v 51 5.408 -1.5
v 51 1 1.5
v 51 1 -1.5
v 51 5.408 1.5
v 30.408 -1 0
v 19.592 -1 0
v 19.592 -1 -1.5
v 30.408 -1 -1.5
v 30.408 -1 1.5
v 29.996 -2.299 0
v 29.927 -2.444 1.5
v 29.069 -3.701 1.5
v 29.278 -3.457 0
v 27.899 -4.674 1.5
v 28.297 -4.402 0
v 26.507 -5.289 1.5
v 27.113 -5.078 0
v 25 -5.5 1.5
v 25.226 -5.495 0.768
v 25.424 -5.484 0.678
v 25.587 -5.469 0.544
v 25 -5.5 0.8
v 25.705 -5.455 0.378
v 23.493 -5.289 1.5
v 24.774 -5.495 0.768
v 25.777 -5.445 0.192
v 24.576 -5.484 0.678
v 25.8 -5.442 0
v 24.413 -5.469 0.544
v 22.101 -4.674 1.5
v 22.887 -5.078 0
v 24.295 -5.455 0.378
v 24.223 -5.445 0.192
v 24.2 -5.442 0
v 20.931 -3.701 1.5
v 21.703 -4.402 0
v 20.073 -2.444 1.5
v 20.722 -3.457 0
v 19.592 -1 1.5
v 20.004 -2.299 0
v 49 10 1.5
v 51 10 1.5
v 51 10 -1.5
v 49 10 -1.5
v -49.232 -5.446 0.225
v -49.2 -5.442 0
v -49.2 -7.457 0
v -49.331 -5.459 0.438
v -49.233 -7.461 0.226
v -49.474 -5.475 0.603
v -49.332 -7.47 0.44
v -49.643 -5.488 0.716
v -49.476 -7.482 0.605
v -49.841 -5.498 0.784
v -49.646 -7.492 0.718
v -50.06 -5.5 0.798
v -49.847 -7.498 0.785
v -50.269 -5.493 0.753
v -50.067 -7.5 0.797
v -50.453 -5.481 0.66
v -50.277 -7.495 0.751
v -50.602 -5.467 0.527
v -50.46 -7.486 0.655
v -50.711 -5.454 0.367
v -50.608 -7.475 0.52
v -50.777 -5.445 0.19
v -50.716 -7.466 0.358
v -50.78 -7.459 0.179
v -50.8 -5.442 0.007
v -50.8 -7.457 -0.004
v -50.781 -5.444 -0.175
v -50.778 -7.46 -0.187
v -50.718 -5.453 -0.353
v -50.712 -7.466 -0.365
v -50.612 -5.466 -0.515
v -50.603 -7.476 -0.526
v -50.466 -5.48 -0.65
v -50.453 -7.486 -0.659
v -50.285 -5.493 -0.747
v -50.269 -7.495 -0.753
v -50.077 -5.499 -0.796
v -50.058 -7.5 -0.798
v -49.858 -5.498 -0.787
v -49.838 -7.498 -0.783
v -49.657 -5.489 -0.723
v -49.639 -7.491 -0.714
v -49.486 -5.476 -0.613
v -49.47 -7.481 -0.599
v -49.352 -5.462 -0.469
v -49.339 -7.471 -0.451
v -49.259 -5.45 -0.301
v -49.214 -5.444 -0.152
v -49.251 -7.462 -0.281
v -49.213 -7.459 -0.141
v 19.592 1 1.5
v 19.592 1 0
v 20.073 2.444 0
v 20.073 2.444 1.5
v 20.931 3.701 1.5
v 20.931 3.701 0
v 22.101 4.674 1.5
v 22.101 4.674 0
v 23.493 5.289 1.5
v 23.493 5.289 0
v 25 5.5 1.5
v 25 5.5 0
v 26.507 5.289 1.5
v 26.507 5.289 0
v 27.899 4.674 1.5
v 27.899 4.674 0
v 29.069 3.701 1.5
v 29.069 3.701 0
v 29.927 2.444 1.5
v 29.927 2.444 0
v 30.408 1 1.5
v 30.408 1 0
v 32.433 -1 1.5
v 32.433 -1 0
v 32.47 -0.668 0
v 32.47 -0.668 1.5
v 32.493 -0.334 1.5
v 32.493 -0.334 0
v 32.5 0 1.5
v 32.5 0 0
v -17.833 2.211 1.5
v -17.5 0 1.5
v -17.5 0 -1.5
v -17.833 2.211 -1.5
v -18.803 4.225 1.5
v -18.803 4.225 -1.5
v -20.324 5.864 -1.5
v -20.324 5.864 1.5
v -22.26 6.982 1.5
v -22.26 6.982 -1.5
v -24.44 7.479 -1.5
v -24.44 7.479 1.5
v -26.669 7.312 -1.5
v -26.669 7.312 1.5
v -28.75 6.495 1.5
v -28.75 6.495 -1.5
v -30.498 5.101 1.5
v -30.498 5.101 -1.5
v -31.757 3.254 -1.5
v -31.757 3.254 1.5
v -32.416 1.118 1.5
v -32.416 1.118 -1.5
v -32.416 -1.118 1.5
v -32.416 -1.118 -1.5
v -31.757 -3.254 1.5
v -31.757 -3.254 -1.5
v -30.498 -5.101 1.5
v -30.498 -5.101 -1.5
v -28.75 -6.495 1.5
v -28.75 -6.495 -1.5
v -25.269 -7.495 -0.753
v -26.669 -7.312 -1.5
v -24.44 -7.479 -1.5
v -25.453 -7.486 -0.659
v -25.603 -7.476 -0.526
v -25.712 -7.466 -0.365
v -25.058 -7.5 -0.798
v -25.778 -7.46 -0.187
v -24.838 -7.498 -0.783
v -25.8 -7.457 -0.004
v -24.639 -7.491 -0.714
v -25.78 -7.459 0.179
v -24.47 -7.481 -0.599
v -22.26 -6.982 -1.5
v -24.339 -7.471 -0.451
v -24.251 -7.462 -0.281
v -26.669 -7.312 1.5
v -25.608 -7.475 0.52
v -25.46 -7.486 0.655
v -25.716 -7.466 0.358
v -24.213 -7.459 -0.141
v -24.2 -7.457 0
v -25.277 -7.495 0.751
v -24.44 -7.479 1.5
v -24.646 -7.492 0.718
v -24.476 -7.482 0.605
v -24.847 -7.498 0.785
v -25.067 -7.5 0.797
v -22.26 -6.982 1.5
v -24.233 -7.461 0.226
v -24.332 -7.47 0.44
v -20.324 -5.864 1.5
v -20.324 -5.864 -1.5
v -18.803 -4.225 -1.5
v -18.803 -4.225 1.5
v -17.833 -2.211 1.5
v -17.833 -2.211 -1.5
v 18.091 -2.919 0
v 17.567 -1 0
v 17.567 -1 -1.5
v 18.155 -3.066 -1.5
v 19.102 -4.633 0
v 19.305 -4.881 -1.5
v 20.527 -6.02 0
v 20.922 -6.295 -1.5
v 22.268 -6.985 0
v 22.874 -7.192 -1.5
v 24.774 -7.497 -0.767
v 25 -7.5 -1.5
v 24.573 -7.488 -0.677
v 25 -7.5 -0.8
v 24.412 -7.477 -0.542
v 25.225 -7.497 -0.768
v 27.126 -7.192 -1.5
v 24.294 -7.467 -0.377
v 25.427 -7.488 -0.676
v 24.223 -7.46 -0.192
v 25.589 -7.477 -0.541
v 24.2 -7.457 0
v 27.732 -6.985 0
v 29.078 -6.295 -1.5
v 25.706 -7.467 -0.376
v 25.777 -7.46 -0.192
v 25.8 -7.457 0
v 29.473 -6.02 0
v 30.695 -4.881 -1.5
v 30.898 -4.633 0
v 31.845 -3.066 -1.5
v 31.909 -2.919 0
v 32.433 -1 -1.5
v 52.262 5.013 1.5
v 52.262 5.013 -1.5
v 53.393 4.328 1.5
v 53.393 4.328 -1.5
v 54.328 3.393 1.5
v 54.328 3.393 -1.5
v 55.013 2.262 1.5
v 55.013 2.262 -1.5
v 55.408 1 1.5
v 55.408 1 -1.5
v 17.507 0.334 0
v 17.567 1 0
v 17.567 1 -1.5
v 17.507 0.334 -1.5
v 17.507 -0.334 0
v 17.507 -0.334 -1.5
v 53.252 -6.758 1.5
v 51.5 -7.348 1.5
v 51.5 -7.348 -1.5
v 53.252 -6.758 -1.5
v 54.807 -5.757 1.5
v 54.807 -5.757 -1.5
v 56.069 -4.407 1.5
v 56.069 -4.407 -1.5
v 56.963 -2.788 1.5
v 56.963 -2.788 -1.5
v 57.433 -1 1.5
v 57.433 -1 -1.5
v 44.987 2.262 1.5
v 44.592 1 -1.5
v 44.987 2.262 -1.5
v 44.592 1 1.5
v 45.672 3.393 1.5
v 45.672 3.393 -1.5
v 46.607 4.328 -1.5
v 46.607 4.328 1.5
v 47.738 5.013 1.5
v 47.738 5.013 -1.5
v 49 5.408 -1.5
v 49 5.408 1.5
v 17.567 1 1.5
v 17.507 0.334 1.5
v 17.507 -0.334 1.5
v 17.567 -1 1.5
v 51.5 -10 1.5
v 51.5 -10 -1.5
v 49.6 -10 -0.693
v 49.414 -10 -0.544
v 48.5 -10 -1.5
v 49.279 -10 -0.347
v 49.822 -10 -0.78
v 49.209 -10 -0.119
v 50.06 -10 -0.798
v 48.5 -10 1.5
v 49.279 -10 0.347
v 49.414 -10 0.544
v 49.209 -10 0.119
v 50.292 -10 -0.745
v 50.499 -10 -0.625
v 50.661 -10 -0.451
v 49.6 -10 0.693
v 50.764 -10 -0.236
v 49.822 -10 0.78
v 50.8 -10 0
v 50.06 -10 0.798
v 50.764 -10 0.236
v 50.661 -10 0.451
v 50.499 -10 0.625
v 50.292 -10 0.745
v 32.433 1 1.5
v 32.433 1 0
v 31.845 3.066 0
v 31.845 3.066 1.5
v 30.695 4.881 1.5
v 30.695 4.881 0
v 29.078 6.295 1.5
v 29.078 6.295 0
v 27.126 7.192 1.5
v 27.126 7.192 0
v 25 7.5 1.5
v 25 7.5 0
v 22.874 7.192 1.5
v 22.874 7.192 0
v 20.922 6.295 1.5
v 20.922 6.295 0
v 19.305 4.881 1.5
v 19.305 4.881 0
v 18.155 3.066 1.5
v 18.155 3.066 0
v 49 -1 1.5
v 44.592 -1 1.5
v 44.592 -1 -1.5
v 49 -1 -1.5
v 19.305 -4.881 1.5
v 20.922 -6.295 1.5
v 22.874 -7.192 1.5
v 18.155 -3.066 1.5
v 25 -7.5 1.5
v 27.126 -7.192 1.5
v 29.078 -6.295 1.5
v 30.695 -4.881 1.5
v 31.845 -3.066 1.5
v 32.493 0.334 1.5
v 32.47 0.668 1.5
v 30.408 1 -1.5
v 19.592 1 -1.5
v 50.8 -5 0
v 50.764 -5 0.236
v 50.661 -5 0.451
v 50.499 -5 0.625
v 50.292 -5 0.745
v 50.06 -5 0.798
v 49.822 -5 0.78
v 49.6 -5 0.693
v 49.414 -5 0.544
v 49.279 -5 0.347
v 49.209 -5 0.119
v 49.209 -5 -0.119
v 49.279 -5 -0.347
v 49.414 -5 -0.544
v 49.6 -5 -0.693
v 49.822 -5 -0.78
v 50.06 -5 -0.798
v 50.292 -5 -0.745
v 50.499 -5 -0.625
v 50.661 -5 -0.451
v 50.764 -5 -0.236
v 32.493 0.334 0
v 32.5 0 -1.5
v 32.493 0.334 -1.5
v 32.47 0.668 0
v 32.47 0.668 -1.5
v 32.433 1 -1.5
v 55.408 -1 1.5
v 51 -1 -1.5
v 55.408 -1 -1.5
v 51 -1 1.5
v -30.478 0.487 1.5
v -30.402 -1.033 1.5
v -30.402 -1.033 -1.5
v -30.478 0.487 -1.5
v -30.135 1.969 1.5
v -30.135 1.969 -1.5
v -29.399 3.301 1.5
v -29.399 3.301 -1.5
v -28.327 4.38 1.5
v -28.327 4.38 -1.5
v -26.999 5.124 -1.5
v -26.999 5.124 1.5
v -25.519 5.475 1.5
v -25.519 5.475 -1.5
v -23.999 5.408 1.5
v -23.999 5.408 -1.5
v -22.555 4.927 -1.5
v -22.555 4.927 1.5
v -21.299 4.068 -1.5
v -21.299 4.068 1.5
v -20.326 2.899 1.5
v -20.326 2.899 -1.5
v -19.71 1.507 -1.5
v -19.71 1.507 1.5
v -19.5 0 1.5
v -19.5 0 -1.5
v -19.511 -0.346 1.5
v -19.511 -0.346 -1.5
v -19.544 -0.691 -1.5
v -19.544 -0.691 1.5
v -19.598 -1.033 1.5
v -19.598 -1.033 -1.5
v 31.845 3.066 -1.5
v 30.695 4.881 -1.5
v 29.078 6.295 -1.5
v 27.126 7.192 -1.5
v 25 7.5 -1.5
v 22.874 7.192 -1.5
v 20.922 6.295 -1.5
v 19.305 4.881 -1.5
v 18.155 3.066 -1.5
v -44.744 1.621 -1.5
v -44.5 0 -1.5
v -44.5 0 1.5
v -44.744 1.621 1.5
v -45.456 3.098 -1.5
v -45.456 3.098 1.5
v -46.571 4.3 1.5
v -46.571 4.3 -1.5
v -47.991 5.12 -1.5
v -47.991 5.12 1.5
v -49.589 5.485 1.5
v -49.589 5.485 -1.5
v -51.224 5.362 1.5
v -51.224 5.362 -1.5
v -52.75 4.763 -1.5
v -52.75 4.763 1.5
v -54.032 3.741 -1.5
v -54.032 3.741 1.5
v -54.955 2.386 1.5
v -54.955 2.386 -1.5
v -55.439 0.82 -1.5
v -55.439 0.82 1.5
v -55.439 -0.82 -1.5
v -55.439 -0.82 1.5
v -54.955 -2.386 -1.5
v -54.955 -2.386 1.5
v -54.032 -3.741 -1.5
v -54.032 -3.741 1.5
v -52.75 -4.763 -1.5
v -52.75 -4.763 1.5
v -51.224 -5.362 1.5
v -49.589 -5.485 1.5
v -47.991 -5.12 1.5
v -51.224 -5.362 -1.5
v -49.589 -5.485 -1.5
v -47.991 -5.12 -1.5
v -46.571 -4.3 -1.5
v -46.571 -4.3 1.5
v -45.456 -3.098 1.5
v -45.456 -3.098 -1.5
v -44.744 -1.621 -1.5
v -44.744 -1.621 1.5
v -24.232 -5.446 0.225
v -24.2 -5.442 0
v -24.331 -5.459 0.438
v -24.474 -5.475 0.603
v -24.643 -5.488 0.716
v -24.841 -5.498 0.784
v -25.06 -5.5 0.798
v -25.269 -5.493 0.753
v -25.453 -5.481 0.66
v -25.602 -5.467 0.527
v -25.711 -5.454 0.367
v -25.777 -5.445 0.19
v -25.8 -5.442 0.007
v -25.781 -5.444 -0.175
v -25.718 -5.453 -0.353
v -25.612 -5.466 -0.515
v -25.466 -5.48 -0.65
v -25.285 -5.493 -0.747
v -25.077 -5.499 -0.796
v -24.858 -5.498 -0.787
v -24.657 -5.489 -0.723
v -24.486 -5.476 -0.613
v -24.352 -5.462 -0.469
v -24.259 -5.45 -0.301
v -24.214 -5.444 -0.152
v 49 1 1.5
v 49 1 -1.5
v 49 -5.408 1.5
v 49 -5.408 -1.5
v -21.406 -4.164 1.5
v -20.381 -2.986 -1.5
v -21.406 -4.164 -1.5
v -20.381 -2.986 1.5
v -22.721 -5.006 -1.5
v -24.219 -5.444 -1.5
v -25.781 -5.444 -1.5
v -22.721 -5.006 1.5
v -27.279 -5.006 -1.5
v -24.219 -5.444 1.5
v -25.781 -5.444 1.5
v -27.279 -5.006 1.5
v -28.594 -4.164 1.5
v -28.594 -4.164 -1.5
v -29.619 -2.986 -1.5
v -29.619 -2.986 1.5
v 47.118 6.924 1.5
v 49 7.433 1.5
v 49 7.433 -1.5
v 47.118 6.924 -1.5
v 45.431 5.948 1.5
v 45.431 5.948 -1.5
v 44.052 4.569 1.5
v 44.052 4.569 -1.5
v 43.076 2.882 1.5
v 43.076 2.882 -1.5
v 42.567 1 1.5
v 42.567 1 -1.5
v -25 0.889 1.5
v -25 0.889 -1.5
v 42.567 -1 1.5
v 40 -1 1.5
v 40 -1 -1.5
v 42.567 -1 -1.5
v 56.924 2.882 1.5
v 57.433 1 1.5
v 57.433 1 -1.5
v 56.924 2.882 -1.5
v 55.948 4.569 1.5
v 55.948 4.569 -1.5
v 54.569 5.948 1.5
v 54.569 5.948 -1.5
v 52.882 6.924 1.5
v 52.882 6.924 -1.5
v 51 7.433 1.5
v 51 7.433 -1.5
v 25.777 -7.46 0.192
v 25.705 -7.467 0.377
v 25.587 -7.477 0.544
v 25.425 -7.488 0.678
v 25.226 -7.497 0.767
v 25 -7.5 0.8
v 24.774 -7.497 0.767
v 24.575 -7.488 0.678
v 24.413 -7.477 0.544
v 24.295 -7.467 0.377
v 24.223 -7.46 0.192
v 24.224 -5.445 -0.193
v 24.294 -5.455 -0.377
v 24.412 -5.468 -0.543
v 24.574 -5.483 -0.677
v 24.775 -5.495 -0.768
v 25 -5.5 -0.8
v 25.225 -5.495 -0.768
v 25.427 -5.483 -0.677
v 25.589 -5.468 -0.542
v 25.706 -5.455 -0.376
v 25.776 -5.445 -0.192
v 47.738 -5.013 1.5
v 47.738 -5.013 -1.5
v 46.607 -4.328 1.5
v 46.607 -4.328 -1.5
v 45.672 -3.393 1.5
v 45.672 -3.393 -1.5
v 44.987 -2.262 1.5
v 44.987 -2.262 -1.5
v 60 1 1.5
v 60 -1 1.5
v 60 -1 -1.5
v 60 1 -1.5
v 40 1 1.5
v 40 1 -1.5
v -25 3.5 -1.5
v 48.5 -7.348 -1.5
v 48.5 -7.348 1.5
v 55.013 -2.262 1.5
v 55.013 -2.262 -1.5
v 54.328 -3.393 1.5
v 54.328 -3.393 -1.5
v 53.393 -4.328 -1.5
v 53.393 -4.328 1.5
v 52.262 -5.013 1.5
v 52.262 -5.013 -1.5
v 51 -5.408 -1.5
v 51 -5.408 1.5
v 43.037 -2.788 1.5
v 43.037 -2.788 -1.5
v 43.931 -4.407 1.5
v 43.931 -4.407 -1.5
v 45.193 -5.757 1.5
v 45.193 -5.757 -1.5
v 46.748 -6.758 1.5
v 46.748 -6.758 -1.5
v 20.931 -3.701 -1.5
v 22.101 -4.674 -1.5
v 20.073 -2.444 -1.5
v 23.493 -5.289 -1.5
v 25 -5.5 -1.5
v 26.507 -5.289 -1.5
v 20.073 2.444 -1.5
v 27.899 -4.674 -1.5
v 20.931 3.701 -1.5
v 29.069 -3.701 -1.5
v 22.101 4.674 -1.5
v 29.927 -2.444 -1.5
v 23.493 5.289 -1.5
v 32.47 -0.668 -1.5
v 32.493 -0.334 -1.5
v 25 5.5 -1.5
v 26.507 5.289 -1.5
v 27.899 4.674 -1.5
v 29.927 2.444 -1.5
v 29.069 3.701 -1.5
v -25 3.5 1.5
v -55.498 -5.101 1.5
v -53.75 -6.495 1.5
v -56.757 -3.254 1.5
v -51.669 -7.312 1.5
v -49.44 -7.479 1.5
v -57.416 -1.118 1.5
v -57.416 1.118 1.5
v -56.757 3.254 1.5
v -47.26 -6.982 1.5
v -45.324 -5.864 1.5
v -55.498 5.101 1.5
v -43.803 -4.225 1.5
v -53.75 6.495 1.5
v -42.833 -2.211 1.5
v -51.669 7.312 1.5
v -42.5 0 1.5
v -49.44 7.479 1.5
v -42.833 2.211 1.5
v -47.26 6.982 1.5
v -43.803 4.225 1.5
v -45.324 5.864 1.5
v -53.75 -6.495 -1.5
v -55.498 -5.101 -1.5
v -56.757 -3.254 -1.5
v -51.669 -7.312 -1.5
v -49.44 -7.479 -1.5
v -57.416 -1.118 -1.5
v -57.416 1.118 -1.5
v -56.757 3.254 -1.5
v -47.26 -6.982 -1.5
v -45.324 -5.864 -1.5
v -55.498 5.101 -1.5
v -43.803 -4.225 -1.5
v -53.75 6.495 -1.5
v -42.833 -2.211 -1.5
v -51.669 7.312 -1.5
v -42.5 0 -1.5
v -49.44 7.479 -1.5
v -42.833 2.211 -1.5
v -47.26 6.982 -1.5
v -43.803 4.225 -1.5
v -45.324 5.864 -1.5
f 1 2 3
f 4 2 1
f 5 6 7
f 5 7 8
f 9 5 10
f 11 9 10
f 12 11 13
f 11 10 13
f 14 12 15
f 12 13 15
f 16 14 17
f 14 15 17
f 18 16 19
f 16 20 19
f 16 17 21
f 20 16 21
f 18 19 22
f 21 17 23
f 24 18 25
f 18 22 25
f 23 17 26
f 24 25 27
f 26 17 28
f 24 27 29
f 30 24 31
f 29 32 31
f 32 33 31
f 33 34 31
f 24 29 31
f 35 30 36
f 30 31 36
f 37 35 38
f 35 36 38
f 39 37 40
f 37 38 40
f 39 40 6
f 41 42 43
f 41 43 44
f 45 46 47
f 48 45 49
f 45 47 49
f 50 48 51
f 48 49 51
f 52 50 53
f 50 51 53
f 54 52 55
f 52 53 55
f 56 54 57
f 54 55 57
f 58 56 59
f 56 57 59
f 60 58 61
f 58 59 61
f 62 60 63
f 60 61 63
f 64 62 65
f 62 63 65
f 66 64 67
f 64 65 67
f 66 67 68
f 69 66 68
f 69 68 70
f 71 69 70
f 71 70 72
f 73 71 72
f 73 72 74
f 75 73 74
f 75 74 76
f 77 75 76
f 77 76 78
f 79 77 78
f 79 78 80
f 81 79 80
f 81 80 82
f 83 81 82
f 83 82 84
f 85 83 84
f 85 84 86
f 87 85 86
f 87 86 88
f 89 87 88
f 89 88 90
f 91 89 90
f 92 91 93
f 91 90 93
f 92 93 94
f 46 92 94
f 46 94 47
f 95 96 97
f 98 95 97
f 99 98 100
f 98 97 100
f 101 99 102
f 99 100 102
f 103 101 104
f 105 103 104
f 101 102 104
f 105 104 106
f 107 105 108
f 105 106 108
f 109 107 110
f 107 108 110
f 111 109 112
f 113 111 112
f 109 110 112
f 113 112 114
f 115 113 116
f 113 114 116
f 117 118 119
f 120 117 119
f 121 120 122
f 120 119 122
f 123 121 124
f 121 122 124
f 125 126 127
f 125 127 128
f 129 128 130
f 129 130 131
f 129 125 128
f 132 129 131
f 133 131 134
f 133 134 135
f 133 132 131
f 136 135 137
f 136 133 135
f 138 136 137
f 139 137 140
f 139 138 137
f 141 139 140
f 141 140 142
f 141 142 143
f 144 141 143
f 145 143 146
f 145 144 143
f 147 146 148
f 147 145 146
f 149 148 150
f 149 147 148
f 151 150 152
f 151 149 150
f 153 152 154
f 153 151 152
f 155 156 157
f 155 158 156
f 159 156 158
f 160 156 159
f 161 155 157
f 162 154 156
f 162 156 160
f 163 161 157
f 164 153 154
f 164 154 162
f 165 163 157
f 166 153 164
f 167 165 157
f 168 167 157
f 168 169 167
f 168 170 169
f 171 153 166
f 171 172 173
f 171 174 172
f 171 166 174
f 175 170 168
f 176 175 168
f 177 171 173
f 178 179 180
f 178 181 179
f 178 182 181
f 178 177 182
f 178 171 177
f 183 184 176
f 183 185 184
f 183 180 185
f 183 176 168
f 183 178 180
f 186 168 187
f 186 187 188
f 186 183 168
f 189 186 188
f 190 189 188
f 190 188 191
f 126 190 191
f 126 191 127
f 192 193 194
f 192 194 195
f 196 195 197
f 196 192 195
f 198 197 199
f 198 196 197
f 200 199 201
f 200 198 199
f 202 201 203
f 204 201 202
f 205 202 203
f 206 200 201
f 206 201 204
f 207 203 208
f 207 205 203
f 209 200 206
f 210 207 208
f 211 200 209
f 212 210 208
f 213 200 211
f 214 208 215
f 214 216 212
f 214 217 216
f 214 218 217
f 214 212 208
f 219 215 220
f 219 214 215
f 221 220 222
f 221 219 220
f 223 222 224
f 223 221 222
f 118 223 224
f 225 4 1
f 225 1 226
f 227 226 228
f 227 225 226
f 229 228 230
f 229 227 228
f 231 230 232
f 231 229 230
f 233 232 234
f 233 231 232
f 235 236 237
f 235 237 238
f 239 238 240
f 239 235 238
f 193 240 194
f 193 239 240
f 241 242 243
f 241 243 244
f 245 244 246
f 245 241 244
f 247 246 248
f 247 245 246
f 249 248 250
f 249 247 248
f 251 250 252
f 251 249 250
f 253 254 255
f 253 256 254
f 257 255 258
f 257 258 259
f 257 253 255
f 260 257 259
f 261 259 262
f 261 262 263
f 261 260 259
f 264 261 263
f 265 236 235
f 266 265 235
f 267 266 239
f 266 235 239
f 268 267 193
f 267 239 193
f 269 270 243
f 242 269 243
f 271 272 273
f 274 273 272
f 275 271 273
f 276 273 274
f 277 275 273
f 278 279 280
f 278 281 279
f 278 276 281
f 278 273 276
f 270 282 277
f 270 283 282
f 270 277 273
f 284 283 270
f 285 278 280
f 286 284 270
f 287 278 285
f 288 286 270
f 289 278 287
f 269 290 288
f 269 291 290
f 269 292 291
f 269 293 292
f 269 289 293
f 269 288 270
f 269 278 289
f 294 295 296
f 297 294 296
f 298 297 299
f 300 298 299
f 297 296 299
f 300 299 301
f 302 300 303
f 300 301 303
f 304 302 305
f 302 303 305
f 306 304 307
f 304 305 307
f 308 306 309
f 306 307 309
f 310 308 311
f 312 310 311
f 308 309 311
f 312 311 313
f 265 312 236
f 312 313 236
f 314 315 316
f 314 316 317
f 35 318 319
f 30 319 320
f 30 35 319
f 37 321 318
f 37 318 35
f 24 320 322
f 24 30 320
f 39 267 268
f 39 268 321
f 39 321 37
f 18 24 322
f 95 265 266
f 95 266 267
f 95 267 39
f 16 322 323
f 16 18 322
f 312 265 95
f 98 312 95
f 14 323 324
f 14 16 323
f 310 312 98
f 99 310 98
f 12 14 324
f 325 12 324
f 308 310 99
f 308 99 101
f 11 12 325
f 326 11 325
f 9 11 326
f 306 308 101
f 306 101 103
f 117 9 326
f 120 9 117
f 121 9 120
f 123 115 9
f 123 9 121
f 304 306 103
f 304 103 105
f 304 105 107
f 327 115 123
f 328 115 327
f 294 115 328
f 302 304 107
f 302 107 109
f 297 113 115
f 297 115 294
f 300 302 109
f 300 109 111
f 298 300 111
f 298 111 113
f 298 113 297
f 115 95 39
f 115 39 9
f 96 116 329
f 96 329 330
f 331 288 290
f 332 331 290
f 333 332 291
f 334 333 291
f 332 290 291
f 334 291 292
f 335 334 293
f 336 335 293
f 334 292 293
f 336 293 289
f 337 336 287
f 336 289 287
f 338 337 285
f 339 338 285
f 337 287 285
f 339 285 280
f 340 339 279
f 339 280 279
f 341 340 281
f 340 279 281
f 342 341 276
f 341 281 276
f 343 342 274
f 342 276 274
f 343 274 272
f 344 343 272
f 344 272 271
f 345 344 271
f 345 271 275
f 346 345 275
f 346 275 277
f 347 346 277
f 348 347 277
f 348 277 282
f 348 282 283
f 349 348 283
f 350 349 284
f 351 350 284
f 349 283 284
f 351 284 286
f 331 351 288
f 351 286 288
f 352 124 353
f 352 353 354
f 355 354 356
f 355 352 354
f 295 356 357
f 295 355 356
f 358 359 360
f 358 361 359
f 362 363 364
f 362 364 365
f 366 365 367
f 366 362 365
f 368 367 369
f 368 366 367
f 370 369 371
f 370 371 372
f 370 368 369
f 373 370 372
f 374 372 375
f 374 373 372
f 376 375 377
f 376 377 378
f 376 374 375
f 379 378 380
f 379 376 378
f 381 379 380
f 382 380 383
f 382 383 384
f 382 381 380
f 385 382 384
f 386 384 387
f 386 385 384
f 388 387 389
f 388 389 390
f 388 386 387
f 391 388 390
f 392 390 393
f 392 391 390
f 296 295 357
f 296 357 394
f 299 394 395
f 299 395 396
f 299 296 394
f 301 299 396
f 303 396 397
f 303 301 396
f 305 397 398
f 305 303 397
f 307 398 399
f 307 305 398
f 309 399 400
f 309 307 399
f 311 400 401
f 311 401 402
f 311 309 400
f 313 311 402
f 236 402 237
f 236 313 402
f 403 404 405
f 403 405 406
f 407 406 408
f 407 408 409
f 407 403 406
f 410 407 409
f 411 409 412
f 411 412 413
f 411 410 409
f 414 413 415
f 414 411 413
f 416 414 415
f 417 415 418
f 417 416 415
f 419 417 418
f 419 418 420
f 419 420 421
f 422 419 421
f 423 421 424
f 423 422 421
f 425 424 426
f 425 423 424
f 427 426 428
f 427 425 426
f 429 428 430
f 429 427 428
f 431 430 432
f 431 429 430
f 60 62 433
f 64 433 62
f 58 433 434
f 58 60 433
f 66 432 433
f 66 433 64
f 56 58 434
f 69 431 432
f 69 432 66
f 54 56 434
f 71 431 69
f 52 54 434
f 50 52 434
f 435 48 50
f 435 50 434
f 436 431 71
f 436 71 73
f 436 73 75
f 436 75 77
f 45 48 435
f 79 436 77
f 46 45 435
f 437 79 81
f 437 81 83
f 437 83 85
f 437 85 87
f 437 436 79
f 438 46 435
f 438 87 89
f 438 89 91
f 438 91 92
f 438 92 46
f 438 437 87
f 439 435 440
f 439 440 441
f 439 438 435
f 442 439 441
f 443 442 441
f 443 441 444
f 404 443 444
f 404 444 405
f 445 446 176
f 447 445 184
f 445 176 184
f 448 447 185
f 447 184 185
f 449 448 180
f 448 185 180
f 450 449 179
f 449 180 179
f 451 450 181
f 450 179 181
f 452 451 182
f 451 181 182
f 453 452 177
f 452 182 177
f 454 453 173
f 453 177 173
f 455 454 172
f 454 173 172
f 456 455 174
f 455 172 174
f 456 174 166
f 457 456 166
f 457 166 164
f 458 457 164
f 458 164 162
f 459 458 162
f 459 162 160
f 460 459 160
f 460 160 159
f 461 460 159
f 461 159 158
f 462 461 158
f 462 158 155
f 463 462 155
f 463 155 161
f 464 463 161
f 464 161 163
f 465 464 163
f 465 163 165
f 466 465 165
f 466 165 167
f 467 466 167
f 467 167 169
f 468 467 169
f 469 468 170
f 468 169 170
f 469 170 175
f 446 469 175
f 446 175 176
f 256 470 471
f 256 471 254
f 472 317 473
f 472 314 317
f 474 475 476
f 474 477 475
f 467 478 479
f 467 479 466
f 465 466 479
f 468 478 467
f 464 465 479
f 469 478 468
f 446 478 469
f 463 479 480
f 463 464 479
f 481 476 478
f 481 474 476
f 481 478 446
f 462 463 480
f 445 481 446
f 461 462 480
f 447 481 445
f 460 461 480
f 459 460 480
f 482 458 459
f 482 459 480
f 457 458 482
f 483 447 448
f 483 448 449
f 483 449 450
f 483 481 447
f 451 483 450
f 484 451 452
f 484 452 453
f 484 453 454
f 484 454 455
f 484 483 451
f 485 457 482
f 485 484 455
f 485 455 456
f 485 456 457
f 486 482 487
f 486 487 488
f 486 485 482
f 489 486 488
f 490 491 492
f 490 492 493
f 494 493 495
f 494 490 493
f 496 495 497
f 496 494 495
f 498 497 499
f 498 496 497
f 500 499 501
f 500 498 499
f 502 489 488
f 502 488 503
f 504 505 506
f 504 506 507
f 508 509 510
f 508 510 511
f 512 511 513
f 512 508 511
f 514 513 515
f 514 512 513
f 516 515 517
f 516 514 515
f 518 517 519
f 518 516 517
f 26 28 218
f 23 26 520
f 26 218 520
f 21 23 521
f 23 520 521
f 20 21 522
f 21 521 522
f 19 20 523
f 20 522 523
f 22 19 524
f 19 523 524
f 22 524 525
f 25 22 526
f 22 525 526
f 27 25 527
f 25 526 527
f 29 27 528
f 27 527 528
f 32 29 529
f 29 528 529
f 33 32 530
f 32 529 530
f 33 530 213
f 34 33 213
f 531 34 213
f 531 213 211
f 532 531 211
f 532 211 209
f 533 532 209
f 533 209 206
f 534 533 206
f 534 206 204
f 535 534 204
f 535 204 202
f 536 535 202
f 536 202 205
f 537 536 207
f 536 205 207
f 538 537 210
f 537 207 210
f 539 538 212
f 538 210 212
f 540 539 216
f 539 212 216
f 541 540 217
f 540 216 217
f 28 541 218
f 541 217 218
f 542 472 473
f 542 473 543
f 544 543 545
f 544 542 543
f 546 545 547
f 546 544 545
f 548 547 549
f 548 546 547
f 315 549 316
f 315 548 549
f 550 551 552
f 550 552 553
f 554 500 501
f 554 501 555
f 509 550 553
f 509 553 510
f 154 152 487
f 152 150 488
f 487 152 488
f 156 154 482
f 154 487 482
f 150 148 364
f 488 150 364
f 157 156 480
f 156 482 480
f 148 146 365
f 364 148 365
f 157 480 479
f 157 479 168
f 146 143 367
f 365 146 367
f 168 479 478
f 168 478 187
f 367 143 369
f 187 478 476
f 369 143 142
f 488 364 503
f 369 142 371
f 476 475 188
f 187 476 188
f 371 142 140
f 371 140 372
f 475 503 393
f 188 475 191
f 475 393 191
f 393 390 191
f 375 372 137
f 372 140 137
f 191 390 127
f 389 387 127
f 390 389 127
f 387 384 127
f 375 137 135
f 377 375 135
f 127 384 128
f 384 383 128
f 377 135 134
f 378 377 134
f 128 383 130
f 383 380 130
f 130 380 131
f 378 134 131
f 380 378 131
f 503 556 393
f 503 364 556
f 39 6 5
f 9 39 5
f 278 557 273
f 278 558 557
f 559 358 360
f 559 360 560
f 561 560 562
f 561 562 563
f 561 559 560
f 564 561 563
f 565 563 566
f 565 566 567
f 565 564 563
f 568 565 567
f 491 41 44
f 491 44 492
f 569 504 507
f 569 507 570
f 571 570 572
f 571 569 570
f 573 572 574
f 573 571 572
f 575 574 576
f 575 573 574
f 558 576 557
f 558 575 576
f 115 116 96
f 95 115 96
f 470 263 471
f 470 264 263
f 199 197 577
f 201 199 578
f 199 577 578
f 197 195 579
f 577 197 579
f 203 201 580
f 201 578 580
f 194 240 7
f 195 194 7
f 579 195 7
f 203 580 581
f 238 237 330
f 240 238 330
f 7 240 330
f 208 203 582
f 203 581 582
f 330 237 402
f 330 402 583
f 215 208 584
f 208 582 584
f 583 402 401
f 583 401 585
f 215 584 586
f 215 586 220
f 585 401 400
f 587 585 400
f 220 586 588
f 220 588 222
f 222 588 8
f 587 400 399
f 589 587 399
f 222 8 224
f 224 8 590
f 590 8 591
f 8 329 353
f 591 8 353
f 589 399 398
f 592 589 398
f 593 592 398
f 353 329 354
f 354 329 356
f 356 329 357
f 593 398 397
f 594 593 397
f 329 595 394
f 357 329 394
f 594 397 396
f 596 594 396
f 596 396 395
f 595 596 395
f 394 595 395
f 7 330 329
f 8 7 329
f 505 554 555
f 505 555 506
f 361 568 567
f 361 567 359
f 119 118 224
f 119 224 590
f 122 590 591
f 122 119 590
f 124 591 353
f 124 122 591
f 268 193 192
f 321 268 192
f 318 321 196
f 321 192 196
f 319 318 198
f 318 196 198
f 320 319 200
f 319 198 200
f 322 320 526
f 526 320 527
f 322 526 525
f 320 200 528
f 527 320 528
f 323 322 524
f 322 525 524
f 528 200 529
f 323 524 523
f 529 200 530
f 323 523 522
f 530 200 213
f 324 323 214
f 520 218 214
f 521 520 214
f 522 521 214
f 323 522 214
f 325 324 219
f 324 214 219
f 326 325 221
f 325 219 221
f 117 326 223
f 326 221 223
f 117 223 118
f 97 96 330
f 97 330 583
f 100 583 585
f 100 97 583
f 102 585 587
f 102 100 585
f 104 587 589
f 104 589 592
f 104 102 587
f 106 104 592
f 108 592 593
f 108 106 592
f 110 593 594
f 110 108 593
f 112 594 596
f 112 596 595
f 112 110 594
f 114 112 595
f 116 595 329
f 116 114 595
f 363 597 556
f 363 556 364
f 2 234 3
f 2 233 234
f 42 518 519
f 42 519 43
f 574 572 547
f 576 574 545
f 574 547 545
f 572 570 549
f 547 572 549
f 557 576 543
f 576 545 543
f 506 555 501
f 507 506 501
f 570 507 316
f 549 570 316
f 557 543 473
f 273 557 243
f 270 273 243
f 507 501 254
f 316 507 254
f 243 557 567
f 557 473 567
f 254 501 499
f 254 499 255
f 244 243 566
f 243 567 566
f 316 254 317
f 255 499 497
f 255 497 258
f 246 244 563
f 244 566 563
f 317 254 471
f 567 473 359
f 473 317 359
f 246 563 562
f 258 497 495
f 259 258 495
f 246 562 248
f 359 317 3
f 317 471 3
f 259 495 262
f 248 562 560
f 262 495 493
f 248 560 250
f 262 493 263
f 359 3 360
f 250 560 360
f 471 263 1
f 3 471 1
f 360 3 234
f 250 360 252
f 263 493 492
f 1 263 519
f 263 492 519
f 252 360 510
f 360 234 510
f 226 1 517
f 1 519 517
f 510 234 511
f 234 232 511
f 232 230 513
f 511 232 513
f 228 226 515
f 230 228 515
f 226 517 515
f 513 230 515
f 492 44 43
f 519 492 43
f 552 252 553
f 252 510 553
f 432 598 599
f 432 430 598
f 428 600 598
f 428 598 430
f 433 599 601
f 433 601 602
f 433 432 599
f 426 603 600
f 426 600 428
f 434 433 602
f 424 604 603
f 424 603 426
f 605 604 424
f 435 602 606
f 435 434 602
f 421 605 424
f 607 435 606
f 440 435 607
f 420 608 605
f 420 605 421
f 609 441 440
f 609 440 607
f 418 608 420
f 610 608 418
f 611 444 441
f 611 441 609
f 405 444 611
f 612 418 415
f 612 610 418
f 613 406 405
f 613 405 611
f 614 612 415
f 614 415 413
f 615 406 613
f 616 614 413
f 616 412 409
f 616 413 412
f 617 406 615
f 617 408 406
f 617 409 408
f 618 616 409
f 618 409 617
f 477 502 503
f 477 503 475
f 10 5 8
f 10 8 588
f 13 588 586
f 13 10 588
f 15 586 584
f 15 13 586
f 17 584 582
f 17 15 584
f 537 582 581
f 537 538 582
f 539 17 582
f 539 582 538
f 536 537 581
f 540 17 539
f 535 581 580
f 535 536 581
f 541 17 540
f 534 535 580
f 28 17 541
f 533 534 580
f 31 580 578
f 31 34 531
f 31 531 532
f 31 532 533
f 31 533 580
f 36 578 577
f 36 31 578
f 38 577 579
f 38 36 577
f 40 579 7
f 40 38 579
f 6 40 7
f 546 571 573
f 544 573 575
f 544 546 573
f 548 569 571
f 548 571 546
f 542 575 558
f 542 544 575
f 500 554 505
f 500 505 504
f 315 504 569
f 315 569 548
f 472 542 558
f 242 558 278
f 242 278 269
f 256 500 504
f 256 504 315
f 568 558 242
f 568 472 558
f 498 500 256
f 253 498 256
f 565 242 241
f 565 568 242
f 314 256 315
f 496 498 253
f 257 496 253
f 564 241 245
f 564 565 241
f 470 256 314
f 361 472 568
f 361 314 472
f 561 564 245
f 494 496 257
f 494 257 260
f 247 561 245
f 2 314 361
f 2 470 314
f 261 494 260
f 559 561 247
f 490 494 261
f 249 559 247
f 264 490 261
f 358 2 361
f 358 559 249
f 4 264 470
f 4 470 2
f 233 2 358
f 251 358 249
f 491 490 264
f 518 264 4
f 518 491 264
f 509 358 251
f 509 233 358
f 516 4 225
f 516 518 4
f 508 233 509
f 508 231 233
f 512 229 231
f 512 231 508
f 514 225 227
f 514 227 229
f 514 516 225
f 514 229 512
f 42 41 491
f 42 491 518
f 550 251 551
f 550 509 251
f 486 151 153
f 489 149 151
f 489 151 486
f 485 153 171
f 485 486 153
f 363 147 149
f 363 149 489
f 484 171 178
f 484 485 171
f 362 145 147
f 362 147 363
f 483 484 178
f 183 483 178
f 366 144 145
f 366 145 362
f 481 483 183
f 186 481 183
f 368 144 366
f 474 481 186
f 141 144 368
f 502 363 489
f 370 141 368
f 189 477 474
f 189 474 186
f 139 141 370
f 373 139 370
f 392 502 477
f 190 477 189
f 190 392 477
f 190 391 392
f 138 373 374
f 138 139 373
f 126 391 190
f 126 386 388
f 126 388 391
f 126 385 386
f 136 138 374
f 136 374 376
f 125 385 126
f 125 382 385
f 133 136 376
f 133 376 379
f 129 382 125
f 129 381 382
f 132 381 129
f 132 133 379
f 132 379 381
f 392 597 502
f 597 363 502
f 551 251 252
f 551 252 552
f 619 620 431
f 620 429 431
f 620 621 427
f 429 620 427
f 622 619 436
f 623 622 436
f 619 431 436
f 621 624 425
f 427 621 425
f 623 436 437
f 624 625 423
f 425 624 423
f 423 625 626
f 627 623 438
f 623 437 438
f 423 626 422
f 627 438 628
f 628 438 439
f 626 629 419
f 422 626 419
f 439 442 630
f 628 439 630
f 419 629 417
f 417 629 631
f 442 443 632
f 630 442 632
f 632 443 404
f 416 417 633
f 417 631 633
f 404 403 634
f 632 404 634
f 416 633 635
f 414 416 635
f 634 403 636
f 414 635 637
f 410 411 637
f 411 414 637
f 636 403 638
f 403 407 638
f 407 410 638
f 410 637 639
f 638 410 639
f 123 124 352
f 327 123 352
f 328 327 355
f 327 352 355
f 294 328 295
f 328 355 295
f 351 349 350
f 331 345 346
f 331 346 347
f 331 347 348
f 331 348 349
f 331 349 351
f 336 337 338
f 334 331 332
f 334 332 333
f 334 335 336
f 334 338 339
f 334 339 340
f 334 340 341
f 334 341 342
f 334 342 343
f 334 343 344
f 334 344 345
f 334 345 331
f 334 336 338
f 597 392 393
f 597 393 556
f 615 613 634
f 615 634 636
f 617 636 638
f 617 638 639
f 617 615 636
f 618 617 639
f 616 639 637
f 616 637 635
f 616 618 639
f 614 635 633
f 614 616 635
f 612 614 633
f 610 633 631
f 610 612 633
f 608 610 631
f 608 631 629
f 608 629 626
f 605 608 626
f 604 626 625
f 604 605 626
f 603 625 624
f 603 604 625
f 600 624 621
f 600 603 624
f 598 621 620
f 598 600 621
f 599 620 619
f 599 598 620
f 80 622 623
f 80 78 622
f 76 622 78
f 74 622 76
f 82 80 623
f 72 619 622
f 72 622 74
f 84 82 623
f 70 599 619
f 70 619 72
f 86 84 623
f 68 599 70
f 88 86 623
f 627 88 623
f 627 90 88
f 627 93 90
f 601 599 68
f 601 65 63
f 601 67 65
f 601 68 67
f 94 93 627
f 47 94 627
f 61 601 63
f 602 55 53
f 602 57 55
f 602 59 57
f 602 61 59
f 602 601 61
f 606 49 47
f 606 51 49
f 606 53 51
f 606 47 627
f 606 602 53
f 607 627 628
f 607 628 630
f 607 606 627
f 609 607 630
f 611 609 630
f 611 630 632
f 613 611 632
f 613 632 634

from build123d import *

# Parameters (mm, degrees)
F0_W     = 2
F0_H     = 2
F1_DEPTH = 1.5
F0_R     = 7.5
F0_R_2   = 5.5
F2_R     = 0.8
F3_DEPTH = 5


with BuildPart() as f1:
    # F0 (on Top) → F1 (new body, symmetric)
    with BuildSketch(Plane.XY):
        with BuildLine():
            ThreePointArc((57.4330343737, -1), (57.4832398666, -0.5011198447), (57.5, 0))
            ThreePointArc((57.5, 0), (57.4832398666, 0.5011198447), (57.4330343737, 1))
            Line((57.4330343737, 1), (55.4083269132, 1))
            ThreePointArc((55.4083269132, 1), (55.4770337785, 0.502096593), (55.5, 0))
            ThreePointArc((55.5, 0), (55.4770337785, -0.502096593), (55.4083269132, -1))
            Line((55.4083269132, -1), (57.4330343737, -1))
        make_face()
        with BuildLine():
            ThreePointArc((57.4330343737, 1), (57.4832398666, 0.5011198447), (57.5, 0))
            ThreePointArc((57.5, 0), (57.4832398666, -0.5011198447), (57.4330343737, -1))
            Line((57.4330343737, -1), (60, -1))
            Line((60, -1), (60, 1))
            Line((60, 1), (57.4330343737, 1))
        make_face()
        with BuildLine():
            Line((55.4083269132, 1), (57.4330343737, 1))
            ThreePointArc((57.4330343737, 1), (55.3033008589, 5.3033008589), (51, 7.4330343737))
            Line((51, 7.4330343737), (51, 5.4083269132))
            ThreePointArc((51, 5.4083269132), (53.8890872965, 3.8890872965), (55.4083269132, 1))
        make_face()
        with BuildLine():
            ThreePointArc((51.5, -7.3484692283), (55.4795566578, -5.1209822138), (57.4330343737, -1))
            Line((57.4330343737, -1), (55.4083269132, -1))
            ThreePointArc((55.4083269132, -1), (53.8890872965, -3.8890872965), (51, -5.4083269132))
            Line((51, -5.4083269132), (51, -7.3484692283))
            Line((51, -7.3484692283), (51.5, -7.3484692283))
        make_face()
        with BuildLine():
            Line((51, 5.4083269132), (51, 7.4330343737))
            ThreePointArc((51, 7.4330343737), (50, 7.5), (49, 7.4330343737))
            Line((49, 7.4330343737), (49, 5.4083269132))
            ThreePointArc((49, 5.4083269132), (50, 5.5), (51, 5.4083269132))
        make_face()
        with BuildLine():
            ThreePointArc((49, 7.4330343737), (50, 7.5), (51, 7.4330343737))
            Line((51, 7.4330343737), (51, 10))
            Line((51, 10), (49, 10))
            Line((49, 10), (49, 7.4330343737))
        make_face()
        with BuildLine():
            ThreePointArc((55.5, 0), (55.4770337785, 0.502096593), (55.4083269132, 1))
            Line((55.4083269132, 1), (51, 1))
            Line((51, 1), (51, -1))
            Line((51, -1), (55.4083269132, -1))
            ThreePointArc((55.4083269132, -1), (55.4770337785, -0.502096593), (55.5, 0))
        make_face()
        with BuildLine():
            Line((51.5, -10), (51.5, -7.3484692283))
            ThreePointArc((51.5, -7.3484692283), (51.2507149219, -7.3949788495), (51, -7.4330343737))
            Line((51, -7.4330343737), (51, -10))
            Line((51, -10), (51.5, -10))
        make_face()
        with BuildLine():
            ThreePointArc((51, -7.4330343737), (51.2507149219, -7.3949788495), (51.5, -7.3484692283))
            Line((51.5, -7.3484692283), (51, -7.3484692283))
            Line((51, -7.3484692283), (51, -7.4330343737))
        make_face()
        with BuildLine():
            Line((49, 5.4083269132), (49, 7.4330343737))
            ThreePointArc((49, 7.4330343737), (44.6966991411, 5.3033008589), (42.5669656263, 1))
            Line((42.5669656263, 1), (44.5916730868, 1))
            ThreePointArc((44.5916730868, 1), (46.1109127035, 3.8890872965), (49, 5.4083269132))
        make_face()
        with BuildLine():
            Line((51, 1), (51, 5.4083269132))
            ThreePointArc((51, 5.4083269132), (50, 5.5), (49, 5.4083269132))
            Line((49, 5.4083269132), (49, 1))
            Line((49, 1), (51, 1))
        make_face()
        with Locations((50, 0)):
            Rectangle(F0_W, F0_H)
        with BuildLine():
            Line((51, -10), (51, -7.4330343737))
            ThreePointArc((51, -7.4330343737), (50, -7.5), (49, -7.4330343737))
            Line((49, -7.4330343737), (49, -10))
            Line((49, -10), (51, -10))
        make_face()
        with BuildLine():
            ThreePointArc((49, -7.4330343737), (50, -7.5), (51, -7.4330343737))
            Line((51, -7.4330343737), (51, -7.3484692283))
            Line((51, -7.3484692283), (49, -7.3484692283))
            Line((49, -7.3484692283), (49, -7.4330343737))
        make_face()
        with BuildLine():
            Line((49, -7.3484692283), (51, -7.3484692283))
            Line((51, -7.3484692283), (51, -5.4083269132))
            ThreePointArc((51, -5.4083269132), (50, -5.5), (49, -5.4083269132))
            Line((49, -5.4083269132), (49, -7.3484692283))
        make_face()
        with BuildLine():
            ThreePointArc((49, -5.4083269132), (50, -5.5), (51, -5.4083269132))
            Line((51, -5.4083269132), (51, -1))
            Line((51, -1), (49, -1))
            Line((49, -1), (49, -5.4083269132))
        make_face()
        with BuildLine():
            Line((44.5916730868, 1), (42.5669656263, 1))
            ThreePointArc((42.5669656263, 1), (42.5, 0), (42.5669656263, -1))
            Line((42.5669656263, -1), (44.5916730868, -1))
            ThreePointArc((44.5916730868, -1), (44.5, 0), (44.5916730868, 1))
        make_face()
        with BuildLine():
            ThreePointArc((42.5669656263, -1), (42.5, 0), (42.5669656263, 1))
            Line((42.5669656263, 1), (40, 1))
            Line((40, 1), (40, -1))
            Line((40, -1), (42.5669656263, -1))
        make_face()
        with BuildLine():
            Line((49, -1), (49, 1))
            Line((49, 1), (44.5916730868, 1))
            ThreePointArc((44.5916730868, 1), (44.5, 0), (44.5916730868, -1))
            Line((44.5916730868, -1), (49, -1))
        make_face()
        with BuildLine():
            Line((49, -10), (49, -7.4330343737))
            ThreePointArc((49, -7.4330343737), (48.7492850781, -7.3949788495), (48.5, -7.3484692283))
            Line((48.5, -7.3484692283), (48.5, -10))
            Line((48.5, -10), (49, -10))
        make_face()
        with BuildLine():
            ThreePointArc((48.5, -7.3484692283), (48.7492850781, -7.3949788495), (49, -7.4330343737))
            Line((49, -7.4330343737), (49, -7.3484692283))
            Line((49, -7.3484692283), (48.5, -7.3484692283))
        make_face()
        with BuildLine():
            Line((48.5, -7.3484692283), (49, -7.3484692283))
            Line((49, -7.3484692283), (49, -5.4083269132))
            ThreePointArc((49, -5.4083269132), (46.1109127035, -3.8890872965), (44.5916730868, -1))
            Line((44.5916730868, -1), (42.5669656263, -1))
            ThreePointArc((42.5669656263, -1), (44.5204433422, -5.1209822138), (48.5, -7.3484692283))
        make_face()
    extrude(amount=F1_DEPTH, both=True)


with BuildPart() as f1b:
    # F0 (on Top) → F1, piece 2 (new body, symmetric)
    with BuildSketch(Plane.XY):
        with BuildLine():
            ThreePointArc((32.4330343737, -1), (32.4832398666, -0.5011198447), (32.5, 0))
            ThreePointArc((32.5, 0), (32.4832398666, 0.5011198447), (32.4330343737, 1))
            Line((32.4330343737, 1), (32.4330343737, -1))
        make_face()
        with BuildLine():
            Line((30.4083269132, 1), (32.4330343737, 1))
            ThreePointArc((32.4330343737, 1), (25, 7.5), (17.5669656263, 1))
            Line((17.5669656263, 1), (19.5916730868, 1))
            ThreePointArc((19.5916730868, 1), (25, 5.5), (30.4083269132, 1))
        make_face()
        with BuildLine():
            Line((32.4330343737, -1), (32.4330343737, 1))
            Line((32.4330343737, 1), (30.4083269132, 1))
            ThreePointArc((30.4083269132, 1), (30.4770337785, 0.502096593), (30.5, 0))
            ThreePointArc((30.5, 0), (30.4770337785, -0.502096593), (30.4083269132, -1))
            Line((30.4083269132, -1), (32.4330343737, -1))
        make_face()
        with BuildLine():
            ThreePointArc((17.5669656263, -1), (25, -7.5), (32.4330343737, -1))
            Line((32.4330343737, -1), (30.4083269132, -1))
            ThreePointArc((30.4083269132, -1), (25, -5.5), (19.5916730868, -1))
            Line((19.5916730868, -1), (17.5669656263, -1))
        make_face()
        with BuildLine():
            Line((17.5669656263, -1), (17.5669656263, 1))
            ThreePointArc((17.5669656263, 1), (17.5, 0), (17.5669656263, -1))
        make_face()
        with BuildLine():
            Line((19.5916730868, 1), (17.5669656263, 1))
            Line((17.5669656263, 1), (17.5669656263, -1))
            Line((17.5669656263, -1), (19.5916730868, -1))
            ThreePointArc((19.5916730868, -1), (19.5, 0), (19.5916730868, 1))
        make_face()
        with BuildLine():
            ThreePointArc((30.5, 0), (30.4770337785, 0.502096593), (30.4083269132, 1))
            Line((30.4083269132, 1), (19.5916730868, 1))
            ThreePointArc((19.5916730868, 1), (19.5, 0), (19.5916730868, -1))
            Line((19.5916730868, -1), (30.4083269132, -1))
            ThreePointArc((30.4083269132, -1), (30.4770337785, -0.502096593), (30.5, 0))
        make_face()
    extrude(amount=F1_DEPTH, both=True)


with BuildPart() as f1c:
    # F0 (on Top) → F1, piece 3 (new body, symmetric)
    with BuildSketch(Plane.XY):
        with Locations((-25, 0)):
            Circle(F0_R)
        with BuildLine():
            ThreePointArc((-30.4021345309, -1.0329290925), (-25.5187774475, 5.4754789708), (-19.5, 0))
            ThreePointArc((-19.5, 0), (-19.5245210292, -0.5187774475), (-19.5978654691, -1.0329290925))
            ThreePointArc((-19.5978654691, -1.0329290925), (-19.8953014496, -2.0474502947), (-20.38135333, -2.986319296))
            ThreePointArc((-20.38135333, -2.986319296), (-25, -5.5), (-29.61864667, -2.986319296))
            ThreePointArc((-29.61864667, -2.986319296), (-30.1046985504, -2.0474502947), (-30.4021345309, -1.0329290925))
        make_face(mode=Mode.SUBTRACT)
        with BuildLine():
            Line((-25, 3.5), (-30.4021345309, -1.0329290925))
            ThreePointArc((-30.4021345309, -1.0329290925), (-30.1046985504, -2.0474502947), (-29.61864667, -2.986319296))
            Line((-29.61864667, -2.986319296), (-25, 0.8891854213))
            Line((-25, 0.8891854213), (-20.38135333, -2.986319296))
            ThreePointArc((-20.38135333, -2.986319296), (-19.8953014496, -2.0474502947), (-19.5978654691, -1.0329290925))
            Line((-19.5978654691, -1.0329290925), (-25, 3.5))
        make_face()
    extrude(amount=F1_DEPTH, both=True)


with BuildPart() as f1d:
    # F0 (on Top) → F1, piece 4 (new body, symmetric)
    with BuildSketch(Plane.XY):
        with Locations((-50, 0)):
            Circle(F0_R)
        with Locations((-50, 0)):
            Circle(F0_R_2, mode=Mode.SUBTRACT)
    extrude(amount=F1_DEPTH, both=True)


with BuildPart() as f3_tool:
    # F2 (on face) → F3 (new body)
    with BuildSketch(Plane.XZ.offset(10)):
        with Locations((50, 0)):
            Circle(F2_R)
        with Locations((25, 0)):
            Circle(F2_R)
        with Locations((-25, 0)):
            Circle(F2_R)
        with Locations((-50, 0)):
            Circle(F2_R)
    extrude(amount=-F3_DEPTH)


with BuildPart() as f1_1:
    add(f1.part)

    # F3: cut by f3_tool
    add(f3_tool.part, mode=Mode.SUBTRACT)


with BuildPart() as f1b_1:
    add(f1b.part)

    # F3: cut by f3_tool
    add(f3_tool.part, mode=Mode.SUBTRACT)


with BuildPart() as f1c_1:
    add(f1c.part)

    # F3: cut by f3_tool
    add(f3_tool.part, mode=Mode.SUBTRACT)


with BuildPart() as f1d_1:
    add(f1d.part)

    # F3: cut by f3_tool
    add(f3_tool.part, mode=Mode.SUBTRACT)


solid = Compound([f1_1.part, f1b_1.part, f1c_1.part, f1d_1.part])
